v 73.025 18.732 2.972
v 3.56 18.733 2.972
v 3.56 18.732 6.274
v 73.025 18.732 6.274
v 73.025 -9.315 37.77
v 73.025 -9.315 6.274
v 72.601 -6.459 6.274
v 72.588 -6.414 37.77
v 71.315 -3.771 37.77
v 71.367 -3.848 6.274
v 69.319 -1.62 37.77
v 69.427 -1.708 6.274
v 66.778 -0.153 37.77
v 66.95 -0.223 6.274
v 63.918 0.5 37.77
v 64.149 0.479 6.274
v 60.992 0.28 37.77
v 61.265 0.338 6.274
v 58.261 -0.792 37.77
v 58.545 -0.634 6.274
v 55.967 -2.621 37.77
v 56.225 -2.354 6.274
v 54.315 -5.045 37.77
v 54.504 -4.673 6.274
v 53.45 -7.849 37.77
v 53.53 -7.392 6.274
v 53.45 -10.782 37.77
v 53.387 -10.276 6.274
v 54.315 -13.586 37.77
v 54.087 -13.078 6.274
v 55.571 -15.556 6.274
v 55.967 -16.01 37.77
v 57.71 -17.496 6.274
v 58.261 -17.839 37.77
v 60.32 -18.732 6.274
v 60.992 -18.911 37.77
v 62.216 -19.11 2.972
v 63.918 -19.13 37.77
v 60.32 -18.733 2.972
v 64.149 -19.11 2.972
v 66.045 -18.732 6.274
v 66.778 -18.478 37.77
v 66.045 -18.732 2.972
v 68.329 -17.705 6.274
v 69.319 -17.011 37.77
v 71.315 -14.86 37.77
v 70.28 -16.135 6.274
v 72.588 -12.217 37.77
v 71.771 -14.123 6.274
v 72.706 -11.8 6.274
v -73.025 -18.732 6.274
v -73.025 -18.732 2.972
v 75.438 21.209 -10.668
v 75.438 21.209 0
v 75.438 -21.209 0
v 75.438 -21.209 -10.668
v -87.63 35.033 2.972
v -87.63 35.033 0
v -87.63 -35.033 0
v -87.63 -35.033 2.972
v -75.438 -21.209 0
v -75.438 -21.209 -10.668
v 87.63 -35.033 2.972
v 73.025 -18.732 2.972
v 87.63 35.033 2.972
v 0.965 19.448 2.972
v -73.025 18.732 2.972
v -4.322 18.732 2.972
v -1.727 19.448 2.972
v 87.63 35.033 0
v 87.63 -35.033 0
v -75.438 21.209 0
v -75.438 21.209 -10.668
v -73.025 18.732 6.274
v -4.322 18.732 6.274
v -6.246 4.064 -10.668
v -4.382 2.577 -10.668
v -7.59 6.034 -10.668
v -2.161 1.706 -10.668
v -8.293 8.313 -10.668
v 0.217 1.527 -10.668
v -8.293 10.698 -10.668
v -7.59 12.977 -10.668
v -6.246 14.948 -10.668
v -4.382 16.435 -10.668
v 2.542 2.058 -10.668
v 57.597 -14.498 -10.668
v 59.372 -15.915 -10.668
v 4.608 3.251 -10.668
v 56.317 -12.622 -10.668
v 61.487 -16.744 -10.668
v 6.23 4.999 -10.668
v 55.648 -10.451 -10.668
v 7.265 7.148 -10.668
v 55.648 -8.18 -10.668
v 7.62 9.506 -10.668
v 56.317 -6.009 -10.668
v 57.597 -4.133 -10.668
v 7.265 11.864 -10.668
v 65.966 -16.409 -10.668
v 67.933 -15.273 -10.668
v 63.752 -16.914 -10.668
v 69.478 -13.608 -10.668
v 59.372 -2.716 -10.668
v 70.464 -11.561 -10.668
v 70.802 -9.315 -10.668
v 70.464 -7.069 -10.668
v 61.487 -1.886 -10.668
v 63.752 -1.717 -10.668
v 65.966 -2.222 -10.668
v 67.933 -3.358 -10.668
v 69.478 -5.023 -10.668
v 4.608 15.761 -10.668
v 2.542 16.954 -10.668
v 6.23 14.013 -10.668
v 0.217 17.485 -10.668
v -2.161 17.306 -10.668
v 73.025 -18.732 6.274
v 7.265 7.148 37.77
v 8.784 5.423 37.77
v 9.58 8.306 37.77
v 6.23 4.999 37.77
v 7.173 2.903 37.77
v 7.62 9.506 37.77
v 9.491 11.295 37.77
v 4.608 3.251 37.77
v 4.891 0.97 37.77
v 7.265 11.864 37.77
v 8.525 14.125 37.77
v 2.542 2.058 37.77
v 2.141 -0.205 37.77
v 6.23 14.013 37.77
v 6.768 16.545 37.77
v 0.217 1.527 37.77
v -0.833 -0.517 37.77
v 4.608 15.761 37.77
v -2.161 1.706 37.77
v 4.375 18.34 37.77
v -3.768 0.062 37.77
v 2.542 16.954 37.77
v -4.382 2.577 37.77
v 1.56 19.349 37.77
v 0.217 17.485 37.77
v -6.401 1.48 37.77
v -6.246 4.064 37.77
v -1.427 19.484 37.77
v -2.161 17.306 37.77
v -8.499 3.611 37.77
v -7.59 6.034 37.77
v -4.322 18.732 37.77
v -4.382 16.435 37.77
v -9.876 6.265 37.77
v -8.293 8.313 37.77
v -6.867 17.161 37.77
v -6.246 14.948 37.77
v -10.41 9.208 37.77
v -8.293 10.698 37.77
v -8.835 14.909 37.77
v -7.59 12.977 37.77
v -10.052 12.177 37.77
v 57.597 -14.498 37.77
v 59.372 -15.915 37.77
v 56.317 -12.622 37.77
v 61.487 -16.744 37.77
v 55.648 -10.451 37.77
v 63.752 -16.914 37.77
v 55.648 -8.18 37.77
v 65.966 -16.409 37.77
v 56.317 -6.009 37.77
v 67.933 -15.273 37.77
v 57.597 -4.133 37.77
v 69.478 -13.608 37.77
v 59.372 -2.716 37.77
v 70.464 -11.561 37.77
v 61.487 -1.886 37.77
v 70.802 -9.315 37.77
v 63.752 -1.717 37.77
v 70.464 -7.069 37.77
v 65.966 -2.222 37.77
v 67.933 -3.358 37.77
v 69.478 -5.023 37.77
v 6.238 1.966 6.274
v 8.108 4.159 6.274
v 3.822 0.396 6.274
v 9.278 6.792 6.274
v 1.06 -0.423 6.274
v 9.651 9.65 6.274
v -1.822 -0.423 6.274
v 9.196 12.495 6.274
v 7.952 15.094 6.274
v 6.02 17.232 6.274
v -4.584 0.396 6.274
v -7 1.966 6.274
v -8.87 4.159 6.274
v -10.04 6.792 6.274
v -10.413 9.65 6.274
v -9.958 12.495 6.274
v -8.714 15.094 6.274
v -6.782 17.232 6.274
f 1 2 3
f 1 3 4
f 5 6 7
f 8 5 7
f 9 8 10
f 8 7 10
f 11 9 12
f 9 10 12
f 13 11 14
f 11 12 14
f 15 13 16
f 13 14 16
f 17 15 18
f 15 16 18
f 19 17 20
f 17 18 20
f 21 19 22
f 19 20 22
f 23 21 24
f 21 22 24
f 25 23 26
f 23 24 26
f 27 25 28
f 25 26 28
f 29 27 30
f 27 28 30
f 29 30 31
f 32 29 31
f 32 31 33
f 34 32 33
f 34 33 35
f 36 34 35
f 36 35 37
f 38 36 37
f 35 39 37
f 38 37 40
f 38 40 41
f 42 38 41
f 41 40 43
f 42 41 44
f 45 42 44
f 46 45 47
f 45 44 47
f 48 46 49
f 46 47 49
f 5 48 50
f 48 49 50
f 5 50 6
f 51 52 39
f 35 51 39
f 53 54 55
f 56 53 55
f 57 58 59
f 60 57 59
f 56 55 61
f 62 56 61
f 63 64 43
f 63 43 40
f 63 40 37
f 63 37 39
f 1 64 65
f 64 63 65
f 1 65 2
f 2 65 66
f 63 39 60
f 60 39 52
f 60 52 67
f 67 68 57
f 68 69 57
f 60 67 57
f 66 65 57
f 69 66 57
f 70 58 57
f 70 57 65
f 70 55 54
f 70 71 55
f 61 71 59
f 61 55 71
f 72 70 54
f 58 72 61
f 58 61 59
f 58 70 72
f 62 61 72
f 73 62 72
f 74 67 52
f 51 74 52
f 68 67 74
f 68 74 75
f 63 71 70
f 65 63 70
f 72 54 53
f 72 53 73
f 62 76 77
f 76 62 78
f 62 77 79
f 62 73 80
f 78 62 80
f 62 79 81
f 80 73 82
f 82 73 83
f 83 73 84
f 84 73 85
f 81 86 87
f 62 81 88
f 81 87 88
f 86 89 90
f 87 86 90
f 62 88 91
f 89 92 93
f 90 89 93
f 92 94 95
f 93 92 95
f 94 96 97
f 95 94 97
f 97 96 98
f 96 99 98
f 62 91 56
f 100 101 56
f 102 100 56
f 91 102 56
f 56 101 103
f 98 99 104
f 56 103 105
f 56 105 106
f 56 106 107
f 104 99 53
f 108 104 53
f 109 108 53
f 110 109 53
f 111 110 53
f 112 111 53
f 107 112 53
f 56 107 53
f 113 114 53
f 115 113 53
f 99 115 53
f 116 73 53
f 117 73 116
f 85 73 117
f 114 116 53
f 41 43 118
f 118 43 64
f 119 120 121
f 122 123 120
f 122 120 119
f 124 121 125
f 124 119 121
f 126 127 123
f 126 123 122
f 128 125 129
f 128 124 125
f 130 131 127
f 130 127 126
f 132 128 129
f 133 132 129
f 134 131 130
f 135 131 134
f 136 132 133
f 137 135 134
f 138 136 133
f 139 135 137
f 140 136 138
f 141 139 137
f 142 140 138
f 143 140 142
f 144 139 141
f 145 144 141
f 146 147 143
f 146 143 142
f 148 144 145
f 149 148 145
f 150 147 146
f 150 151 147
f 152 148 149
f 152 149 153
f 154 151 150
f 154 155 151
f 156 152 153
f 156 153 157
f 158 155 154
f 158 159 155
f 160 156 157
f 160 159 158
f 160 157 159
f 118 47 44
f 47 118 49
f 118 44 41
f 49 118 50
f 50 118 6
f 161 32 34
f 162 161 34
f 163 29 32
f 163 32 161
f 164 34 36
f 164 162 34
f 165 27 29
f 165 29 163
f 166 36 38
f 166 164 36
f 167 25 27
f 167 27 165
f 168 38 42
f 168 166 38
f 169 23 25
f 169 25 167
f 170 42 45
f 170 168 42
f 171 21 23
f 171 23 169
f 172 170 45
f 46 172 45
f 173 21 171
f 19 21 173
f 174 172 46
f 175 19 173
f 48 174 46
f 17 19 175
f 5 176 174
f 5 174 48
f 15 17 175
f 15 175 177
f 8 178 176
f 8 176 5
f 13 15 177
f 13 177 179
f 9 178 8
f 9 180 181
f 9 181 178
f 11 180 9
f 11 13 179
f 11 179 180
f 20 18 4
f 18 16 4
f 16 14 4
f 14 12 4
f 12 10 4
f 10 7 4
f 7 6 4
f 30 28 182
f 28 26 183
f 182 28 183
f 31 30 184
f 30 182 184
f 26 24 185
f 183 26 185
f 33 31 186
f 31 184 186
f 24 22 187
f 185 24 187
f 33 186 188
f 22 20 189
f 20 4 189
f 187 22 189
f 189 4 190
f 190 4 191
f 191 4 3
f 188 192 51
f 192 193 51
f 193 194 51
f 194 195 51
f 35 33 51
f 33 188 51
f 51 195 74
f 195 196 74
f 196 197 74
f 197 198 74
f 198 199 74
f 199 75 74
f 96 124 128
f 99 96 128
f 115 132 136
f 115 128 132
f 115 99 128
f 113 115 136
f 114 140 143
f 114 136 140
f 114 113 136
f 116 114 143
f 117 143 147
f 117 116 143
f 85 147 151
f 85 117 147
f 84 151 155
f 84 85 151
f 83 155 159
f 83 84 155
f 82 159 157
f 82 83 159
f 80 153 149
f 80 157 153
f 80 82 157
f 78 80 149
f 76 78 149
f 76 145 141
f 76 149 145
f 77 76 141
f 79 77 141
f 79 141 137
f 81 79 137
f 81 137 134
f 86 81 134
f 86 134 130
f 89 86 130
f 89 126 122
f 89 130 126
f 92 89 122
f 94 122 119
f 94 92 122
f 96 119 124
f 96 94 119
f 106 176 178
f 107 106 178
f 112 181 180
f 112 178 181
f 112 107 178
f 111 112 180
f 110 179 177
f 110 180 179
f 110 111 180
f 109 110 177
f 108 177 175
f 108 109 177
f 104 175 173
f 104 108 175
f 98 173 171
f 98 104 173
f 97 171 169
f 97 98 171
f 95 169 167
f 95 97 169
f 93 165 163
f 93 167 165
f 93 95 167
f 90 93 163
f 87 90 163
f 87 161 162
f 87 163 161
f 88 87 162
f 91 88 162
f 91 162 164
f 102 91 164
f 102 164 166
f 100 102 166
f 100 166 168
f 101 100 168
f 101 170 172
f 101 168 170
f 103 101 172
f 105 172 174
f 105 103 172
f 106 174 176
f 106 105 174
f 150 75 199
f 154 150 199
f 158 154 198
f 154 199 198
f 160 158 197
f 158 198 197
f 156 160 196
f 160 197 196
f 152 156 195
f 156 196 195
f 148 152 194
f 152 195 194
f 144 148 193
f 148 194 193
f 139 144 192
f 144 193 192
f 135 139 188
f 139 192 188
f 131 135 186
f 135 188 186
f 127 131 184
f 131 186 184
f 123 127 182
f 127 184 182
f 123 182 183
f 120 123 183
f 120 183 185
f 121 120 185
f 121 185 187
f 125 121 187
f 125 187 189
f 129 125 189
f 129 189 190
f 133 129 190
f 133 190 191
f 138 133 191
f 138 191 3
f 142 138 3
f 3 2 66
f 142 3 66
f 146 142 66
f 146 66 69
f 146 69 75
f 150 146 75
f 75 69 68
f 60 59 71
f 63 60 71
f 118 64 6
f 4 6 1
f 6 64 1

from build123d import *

# Parameters (mm, degrees)
BOSS_EXTRUDE1_DEPTH     = 2.9718
BOSS_EXTRUDE2_DEPTH     = 3.302
BOSS_EXTRUDE3_DEPTH     = 10.668
SKETCH5_R               = 10.033
BOSS_EXTRUDE4_DEPTH     = 34.798
SKETCH4_R               = 9.8425
BOSS_EXTRUDE5_DEPTH     = 34.798
CUT_EXTRUDE1_DEPTH      = 107.07801353
CUT_EXTRUDE1_DEPTH_BACK = 107.07801353
SKETCH6_R               = 7.62
SKETCH6_R_2             = 8.001


with BuildPart() as part:
    # Sketch1 → Boss-Extrude1 (new body)
    with BuildSketch(Plane.XY):
        Polygon((-87.63, 35.03295), (87.63, 35.03295), (87.63, 0), (87.63, -35.03295), (0, -35.03295), (-87.63, -35.03295), (-87.63, 0), align=None)
    extrude(amount=BOSS_EXTRUDE1_DEPTH)

    # Sketch2 → Boss-Extrude2 (add)
    with BuildSketch(Plane.XY.offset(2.9718)):
        Polygon((-73.025, 18.7325), (73.025, 18.7325), (73.025, 0), (73.025, -18.7325), (0, -18.7325), (-73.025, -18.7325), (-73.025, 0), align=None)
    extrude(amount=BOSS_EXTRUDE2_DEPTH)

    # Sketch3 → Boss-Extrude3 (add)
    with BuildSketch(Plane(origin=(0, 0, 0), x_dir=(-1, 0, 0), z_dir=(0, 0, -1))):
        Polygon((-75.438, 21.209), (75.438, 21.209), (75.438, 0), (75.438, -21.209), (0, -21.209), (-75.438, -21.209), (-75.438, 0), align=None)
    extrude(amount=BOSS_EXTRUDE3_DEPTH)

    # Sketch5 → Boss-Extrude4 (add)
    with BuildSketch(Plane.XY.offset(2.9718)):
        with Locations(Location((-0.381, 9.50595, 0), (0, 0, 113.129371467))):
            Circle(SKETCH5_R)
    extrude(amount=BOSS_EXTRUDE4_DEPTH)

    # Sketch4 → Boss-Extrude5 (add)
    with BuildSketch(Plane.XY.offset(2.9718)):
        with Locations((63.1825, -9.31545)):
            Circle(SKETCH4_R)
    extrude(amount=BOSS_EXTRUDE5_DEPTH)

    # Sketch6 → Cut-Extrude1 (cut, two sides: drawn at the far end of the back side and taken through both)
    with BuildSketch(Plane.XY.offset(37.7698).offset(-CUT_EXTRUDE1_DEPTH_BACK)):
        with Locations((63.1825, -9.31545)):
            Circle(SKETCH6_R)
        with Locations((-0.381, 9.50595)):
            Circle(SKETCH6_R_2)
    extrude(amount=CUT_EXTRUDE1_DEPTH + CUT_EXTRUDE1_DEPTH_BACK, mode=Mode.SUBTRACT)


solid = part.part
